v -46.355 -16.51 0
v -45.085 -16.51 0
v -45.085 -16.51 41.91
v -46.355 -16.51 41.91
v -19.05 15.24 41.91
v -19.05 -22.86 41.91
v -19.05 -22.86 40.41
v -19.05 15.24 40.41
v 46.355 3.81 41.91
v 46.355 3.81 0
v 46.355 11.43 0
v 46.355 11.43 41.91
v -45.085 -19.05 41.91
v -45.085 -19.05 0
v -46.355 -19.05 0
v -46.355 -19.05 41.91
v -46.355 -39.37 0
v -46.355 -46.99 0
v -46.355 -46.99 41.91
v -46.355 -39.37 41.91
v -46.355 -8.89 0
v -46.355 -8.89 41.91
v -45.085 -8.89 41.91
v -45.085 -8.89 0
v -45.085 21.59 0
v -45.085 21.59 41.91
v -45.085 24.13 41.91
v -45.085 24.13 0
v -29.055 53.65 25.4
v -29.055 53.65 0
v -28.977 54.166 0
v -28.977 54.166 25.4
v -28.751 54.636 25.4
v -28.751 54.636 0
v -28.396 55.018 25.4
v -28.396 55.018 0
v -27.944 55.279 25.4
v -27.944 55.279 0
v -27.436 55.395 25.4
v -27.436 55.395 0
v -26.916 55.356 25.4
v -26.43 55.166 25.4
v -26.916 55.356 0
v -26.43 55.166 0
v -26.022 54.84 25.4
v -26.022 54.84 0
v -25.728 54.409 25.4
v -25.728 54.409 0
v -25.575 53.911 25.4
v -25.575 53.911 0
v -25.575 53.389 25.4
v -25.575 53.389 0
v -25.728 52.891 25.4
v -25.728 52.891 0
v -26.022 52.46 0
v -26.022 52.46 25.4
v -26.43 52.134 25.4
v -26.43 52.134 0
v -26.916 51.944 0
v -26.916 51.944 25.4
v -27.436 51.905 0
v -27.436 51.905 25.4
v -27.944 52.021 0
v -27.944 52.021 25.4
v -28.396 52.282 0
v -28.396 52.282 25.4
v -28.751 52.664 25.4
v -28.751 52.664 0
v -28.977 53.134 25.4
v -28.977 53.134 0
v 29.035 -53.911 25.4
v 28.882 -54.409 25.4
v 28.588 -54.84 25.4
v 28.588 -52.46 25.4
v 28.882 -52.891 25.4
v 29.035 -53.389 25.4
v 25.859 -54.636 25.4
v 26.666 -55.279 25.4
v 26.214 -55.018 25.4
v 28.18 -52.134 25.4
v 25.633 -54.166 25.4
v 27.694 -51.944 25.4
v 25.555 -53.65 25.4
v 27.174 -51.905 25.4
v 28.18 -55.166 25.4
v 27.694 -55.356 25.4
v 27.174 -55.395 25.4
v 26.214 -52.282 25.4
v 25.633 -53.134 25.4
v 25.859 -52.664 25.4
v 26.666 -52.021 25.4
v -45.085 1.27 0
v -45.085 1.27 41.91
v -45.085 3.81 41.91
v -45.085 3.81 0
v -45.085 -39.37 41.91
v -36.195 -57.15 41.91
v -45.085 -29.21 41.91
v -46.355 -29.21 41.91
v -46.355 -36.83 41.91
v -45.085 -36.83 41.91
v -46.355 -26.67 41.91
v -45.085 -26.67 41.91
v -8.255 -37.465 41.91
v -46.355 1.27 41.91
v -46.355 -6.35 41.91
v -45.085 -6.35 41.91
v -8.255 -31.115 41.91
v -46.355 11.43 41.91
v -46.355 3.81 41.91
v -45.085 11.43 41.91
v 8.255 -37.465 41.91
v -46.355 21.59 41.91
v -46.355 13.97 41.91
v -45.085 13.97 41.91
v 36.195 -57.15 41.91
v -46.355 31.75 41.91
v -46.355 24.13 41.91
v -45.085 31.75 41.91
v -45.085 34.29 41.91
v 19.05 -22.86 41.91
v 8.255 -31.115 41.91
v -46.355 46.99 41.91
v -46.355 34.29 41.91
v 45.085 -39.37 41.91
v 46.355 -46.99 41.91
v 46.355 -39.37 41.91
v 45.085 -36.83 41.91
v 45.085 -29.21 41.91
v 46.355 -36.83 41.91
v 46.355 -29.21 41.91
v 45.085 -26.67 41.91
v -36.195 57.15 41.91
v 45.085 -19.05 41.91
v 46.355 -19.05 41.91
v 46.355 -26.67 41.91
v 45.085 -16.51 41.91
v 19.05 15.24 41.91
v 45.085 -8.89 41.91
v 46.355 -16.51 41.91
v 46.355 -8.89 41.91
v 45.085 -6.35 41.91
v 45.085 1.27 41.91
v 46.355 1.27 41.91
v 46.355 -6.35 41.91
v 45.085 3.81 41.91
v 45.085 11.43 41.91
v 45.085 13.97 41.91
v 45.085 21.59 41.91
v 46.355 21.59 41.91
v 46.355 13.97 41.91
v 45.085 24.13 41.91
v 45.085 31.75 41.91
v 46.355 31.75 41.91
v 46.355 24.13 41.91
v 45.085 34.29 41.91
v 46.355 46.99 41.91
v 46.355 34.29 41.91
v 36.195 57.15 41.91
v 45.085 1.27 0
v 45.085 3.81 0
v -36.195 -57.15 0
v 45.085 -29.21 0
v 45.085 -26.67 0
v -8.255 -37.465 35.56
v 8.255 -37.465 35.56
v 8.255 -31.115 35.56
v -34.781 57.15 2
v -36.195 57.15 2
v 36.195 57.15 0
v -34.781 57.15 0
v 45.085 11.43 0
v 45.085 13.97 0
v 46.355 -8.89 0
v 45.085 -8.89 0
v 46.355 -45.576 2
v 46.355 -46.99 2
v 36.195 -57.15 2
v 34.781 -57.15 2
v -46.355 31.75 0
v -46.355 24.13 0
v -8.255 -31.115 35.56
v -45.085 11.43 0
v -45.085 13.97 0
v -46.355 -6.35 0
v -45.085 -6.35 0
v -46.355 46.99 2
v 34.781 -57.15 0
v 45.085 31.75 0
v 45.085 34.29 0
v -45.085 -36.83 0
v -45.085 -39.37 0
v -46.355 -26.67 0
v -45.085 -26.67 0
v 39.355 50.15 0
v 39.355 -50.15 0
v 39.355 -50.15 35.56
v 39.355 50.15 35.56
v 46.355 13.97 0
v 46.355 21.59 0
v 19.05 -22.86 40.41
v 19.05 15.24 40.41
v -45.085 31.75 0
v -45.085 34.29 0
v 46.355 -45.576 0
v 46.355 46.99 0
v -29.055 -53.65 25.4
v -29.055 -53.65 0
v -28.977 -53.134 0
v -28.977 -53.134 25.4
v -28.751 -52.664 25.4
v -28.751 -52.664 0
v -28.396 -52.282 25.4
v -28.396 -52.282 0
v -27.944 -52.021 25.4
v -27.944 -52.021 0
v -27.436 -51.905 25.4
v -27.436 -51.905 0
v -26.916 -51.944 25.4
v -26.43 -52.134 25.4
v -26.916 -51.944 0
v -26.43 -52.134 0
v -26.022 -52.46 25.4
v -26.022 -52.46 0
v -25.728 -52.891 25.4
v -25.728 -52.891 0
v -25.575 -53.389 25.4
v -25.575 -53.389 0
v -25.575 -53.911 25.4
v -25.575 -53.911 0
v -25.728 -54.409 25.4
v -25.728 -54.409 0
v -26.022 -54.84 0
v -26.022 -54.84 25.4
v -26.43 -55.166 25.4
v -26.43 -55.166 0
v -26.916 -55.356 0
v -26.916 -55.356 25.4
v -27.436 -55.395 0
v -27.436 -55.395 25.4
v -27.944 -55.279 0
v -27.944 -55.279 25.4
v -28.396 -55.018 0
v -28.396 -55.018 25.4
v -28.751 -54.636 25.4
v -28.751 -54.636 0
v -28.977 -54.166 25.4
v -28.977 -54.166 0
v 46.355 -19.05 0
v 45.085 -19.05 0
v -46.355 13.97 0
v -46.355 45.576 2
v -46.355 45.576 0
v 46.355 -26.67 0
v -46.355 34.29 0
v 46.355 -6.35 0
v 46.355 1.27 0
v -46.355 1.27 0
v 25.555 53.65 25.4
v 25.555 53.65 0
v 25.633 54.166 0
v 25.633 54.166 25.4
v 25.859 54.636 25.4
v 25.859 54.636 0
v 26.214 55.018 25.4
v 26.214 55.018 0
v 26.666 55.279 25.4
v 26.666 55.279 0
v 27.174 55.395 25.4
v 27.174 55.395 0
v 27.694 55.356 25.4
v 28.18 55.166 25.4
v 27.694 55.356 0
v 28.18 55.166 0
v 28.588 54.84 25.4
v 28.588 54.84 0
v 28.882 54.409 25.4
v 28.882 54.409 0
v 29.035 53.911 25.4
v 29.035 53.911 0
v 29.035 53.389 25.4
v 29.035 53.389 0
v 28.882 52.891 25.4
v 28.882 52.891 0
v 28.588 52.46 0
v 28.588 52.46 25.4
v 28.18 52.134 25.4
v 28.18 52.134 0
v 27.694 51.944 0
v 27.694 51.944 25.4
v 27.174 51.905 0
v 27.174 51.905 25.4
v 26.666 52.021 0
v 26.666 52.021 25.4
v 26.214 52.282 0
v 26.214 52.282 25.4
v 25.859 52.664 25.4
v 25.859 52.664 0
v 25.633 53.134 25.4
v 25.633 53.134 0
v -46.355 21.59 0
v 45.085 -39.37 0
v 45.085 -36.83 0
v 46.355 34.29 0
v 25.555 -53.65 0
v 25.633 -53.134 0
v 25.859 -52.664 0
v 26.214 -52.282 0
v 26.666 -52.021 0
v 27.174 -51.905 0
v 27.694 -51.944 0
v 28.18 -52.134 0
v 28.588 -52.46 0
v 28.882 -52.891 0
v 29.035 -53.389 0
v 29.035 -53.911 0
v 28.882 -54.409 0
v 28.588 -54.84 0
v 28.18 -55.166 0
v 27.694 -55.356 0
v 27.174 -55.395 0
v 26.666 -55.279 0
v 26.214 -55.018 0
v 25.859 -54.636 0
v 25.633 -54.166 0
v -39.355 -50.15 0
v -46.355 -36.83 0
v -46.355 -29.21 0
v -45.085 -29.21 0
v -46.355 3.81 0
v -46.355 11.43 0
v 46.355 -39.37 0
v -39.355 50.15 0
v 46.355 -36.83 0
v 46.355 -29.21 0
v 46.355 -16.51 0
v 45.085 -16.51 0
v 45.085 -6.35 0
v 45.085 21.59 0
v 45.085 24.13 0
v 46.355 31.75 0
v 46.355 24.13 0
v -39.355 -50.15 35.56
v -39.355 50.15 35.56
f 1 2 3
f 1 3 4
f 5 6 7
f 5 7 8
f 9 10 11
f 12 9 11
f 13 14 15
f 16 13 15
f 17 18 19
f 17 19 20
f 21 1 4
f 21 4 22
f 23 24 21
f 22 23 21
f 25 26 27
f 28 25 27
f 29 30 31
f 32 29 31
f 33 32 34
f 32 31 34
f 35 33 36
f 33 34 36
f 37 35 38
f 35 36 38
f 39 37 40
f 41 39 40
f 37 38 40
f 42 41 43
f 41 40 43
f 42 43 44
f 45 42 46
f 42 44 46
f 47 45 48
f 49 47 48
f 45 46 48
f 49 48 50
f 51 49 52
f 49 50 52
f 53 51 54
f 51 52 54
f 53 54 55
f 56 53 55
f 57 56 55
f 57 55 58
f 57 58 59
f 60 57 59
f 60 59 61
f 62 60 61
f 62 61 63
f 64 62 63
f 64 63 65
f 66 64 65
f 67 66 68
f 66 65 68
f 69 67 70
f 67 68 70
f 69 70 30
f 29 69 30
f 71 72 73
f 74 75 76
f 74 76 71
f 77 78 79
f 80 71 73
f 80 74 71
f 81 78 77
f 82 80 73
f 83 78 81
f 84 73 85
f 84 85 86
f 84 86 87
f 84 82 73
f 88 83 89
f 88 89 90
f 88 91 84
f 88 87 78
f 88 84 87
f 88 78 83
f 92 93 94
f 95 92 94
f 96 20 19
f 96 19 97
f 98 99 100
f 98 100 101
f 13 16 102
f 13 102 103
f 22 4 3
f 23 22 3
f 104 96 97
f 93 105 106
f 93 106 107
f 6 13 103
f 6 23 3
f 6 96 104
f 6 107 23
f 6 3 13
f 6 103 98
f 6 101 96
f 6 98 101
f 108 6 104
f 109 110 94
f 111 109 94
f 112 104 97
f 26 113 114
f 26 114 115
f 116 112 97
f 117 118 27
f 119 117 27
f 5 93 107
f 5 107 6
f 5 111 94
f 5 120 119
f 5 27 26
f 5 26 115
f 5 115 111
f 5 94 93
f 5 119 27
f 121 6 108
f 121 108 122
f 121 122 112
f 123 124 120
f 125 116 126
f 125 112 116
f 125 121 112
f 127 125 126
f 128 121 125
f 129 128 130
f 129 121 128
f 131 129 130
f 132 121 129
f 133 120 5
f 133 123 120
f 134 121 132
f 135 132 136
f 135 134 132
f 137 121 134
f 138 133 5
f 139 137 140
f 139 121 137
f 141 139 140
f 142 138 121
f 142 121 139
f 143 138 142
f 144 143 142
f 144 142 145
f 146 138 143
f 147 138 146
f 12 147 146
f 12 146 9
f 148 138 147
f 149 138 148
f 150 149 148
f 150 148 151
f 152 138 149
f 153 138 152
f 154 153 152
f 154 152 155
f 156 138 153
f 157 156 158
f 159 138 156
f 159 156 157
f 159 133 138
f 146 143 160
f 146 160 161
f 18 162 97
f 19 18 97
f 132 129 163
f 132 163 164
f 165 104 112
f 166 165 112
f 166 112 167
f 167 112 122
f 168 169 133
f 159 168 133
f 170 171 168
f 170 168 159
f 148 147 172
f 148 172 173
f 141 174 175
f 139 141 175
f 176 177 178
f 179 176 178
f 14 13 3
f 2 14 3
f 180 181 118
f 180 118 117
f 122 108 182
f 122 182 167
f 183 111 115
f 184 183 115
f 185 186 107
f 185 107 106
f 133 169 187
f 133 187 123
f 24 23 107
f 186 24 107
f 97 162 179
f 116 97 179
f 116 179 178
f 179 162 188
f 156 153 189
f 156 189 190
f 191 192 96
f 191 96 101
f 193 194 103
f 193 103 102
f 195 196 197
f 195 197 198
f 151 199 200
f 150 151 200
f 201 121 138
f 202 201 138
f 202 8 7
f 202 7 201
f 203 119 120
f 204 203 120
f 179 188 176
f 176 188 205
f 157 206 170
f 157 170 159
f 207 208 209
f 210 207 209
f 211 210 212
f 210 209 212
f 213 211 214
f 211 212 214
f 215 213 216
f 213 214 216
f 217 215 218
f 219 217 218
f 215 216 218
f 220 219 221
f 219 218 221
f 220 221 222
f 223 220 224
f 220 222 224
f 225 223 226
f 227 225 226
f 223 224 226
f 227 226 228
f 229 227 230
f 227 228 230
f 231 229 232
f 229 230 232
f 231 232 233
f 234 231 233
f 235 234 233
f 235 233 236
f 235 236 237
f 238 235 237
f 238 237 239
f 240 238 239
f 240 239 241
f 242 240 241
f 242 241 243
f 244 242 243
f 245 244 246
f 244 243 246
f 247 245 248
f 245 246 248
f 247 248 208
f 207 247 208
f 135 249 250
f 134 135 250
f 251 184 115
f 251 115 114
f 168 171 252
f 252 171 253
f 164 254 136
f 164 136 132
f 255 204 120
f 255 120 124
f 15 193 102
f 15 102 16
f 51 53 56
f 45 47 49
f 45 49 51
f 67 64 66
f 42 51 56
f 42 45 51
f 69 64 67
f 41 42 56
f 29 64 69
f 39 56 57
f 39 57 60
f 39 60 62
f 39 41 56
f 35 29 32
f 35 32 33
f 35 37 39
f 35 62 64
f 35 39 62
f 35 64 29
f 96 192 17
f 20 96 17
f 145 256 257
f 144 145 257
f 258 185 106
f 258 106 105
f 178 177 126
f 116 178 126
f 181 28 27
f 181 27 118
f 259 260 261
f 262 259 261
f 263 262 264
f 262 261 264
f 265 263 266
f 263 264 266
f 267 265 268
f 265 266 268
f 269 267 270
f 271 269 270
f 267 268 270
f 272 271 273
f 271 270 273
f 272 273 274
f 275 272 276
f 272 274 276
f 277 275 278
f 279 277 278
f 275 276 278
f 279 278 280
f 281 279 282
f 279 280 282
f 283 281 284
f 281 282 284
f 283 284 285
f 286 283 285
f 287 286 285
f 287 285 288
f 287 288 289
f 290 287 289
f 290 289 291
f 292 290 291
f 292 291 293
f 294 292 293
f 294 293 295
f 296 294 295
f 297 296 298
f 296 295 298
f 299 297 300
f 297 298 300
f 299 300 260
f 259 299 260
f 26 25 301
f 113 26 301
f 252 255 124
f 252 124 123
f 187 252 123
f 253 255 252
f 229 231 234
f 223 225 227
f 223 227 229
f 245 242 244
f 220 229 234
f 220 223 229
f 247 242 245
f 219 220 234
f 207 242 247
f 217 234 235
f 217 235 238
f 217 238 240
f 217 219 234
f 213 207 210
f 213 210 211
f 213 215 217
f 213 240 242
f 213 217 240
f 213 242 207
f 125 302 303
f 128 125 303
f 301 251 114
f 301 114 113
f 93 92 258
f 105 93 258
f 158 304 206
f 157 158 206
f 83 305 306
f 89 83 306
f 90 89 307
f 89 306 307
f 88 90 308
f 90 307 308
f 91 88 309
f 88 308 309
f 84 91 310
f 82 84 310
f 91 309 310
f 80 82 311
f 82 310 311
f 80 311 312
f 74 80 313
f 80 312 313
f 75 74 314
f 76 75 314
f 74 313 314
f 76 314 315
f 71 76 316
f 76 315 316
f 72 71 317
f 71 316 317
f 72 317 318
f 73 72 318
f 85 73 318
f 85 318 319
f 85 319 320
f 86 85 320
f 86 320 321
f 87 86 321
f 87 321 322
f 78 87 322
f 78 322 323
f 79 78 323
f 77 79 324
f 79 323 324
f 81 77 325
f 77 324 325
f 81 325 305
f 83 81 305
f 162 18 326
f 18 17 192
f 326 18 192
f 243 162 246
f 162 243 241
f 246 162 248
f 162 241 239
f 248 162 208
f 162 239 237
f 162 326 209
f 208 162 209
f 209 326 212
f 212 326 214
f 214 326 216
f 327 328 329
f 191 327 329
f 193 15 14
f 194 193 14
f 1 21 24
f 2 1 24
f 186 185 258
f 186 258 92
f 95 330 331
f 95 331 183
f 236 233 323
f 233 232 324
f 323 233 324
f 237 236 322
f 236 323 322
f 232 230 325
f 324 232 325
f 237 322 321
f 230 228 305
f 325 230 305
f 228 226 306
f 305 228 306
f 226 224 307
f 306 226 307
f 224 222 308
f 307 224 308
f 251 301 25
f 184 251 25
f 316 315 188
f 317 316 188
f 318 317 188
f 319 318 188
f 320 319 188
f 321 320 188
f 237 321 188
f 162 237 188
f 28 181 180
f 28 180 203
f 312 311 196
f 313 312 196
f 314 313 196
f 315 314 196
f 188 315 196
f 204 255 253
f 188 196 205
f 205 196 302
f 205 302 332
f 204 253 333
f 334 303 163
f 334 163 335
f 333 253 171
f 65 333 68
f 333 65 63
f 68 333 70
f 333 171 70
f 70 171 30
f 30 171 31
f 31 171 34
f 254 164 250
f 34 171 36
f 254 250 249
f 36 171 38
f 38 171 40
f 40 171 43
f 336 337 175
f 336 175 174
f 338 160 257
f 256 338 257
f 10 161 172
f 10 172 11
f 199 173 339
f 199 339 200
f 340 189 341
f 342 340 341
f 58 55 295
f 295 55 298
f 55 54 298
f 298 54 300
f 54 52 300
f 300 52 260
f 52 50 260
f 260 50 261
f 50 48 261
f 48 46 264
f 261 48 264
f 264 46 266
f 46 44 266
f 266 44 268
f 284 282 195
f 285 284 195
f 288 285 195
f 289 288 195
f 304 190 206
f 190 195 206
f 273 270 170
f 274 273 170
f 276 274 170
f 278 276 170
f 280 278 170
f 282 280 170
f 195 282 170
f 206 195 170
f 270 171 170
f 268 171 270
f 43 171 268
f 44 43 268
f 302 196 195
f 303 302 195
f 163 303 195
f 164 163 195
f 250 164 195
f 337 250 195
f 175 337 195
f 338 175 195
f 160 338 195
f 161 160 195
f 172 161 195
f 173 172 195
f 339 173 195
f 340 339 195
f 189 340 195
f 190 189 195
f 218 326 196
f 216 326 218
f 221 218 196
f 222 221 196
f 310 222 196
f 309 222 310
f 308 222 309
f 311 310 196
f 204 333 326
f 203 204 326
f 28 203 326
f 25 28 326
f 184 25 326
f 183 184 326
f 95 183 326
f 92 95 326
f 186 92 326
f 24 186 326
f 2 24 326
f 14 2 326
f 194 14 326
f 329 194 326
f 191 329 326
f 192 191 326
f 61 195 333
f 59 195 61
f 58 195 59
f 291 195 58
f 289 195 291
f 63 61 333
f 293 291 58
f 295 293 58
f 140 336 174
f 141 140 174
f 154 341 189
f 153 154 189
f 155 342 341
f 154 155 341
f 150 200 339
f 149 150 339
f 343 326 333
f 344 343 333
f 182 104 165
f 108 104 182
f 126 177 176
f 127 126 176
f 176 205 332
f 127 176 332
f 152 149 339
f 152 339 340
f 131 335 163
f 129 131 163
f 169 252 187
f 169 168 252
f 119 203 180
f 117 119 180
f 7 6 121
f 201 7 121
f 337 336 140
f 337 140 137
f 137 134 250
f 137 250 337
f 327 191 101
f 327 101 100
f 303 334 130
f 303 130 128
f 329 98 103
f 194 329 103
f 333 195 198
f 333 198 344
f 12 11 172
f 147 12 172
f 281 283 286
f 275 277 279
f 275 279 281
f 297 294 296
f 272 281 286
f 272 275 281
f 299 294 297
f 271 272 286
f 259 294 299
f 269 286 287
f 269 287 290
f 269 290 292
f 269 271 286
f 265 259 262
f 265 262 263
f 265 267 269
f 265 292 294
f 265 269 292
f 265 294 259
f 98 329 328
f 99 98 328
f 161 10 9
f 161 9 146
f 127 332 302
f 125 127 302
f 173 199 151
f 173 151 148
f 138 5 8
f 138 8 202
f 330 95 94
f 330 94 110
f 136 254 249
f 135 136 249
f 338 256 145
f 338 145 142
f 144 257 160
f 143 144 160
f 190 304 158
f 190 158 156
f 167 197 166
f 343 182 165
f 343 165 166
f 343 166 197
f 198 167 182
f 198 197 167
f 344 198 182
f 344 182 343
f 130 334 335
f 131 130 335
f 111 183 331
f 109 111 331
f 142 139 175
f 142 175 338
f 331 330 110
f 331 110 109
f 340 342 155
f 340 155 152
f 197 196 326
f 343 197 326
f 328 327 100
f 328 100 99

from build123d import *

# Parameters (mm, degrees)
SKETCH1_W           = 92.71
SKETCH1_H           = 114.3
BOSS_EXTRUDE1_DEPTH = 41.91
SKETCH2_W           = 2.54
SKETCH2_H           = 2.54
CUT_EXTRUDE1_DEPTH  = 85.683862837
CHAMFER1_SIZE       = 10.16
SKETCH3_R           = 1.750000056
CUT_EXTRUDE2_DEPTH  = 25.4
SKETCH4_W           = 78.71
SKETCH4_H           = 100.30000006
CUT_EXTRUDE3_DEPTH  = 35.56
SKETCH6_W           = 16.51
SKETCH6_H           = 6.35
CUT_EXTRUDE5_DEPTH  = 85.683862837
CUT_EXTRUDE6_DEPTH  = 2
SKETCH8_W           = 38.1
SKETCH8_H           = 38.1
CUT_EXTRUDE7_DEPTH  = 1.5


with BuildPart() as part:
    # Sketch1 → Boss-Extrude1 (new body)
    with BuildSketch(Plane.XY):
        Rectangle(SKETCH1_W, SKETCH1_H)
    extrude(amount=BOSS_EXTRUDE1_DEPTH)

    # Sketch2 → Cut-Extrude1 (cut, through all)
    with BuildSketch(Plane(origin=(0, 0, 0), x_dir=(-1, 0, 0), z_dir=(0, 0, -1))):
        with Locations((-46.355, -38.1)):
            Rectangle(SKETCH2_W, SKETCH2_H)
        with Locations((46.355, -38.1)):
            Rectangle(SKETCH2_W, SKETCH2_H)
        with Locations((-46.355, -27.94)):
            Rectangle(SKETCH2_W, SKETCH2_H)
        with Locations((46.355, -27.94)):
            Rectangle(SKETCH2_W, SKETCH2_H)
        with Locations((-46.355, -17.78)):
            Rectangle(SKETCH2_W, SKETCH2_H)
        with Locations((46.355, -17.78)):
            Rectangle(SKETCH2_W, SKETCH2_H)
        with Locations((-46.355, -7.62)):
            Rectangle(SKETCH2_W, SKETCH2_H)
        with Locations((46.355, -7.62)):
            Rectangle(SKETCH2_W, SKETCH2_H)
        with Locations((-46.355, 2.54)):
            Rectangle(SKETCH2_W, SKETCH2_H)
        with Locations((46.355, 2.54)):
            Rectangle(SKETCH2_W, SKETCH2_H)
        with Locations((-46.355, 12.7)):
            Rectangle(SKETCH2_W, SKETCH2_H)
        with Locations((46.355, 12.7)):
            Rectangle(SKETCH2_W, SKETCH2_H)
        with Locations((-46.355, 22.86)):
            Rectangle(SKETCH2_W, SKETCH2_H)
        with Locations((46.355, 22.86)):
            Rectangle(SKETCH2_W, SKETCH2_H)
        with Locations((-46.355, 33.02)):
            Rectangle(SKETCH2_W, SKETCH2_H)
        with Locations((46.355, 33.02)):
            Rectangle(SKETCH2_W, SKETCH2_H)
    extrude(amount=-CUT_EXTRUDE1_DEPTH, mode=Mode.SUBTRACT)

    # Chamfer1
    chamfer1_edges = [part.edges().sort_by_distance(p)[0] for p in [
        (46.355, -57.15, 20.955),
        (-46.355, -57.15, 20.955),
        (-46.355, 57.15, 20.955),
        (46.355, 57.15, 20.955),
    ]]
    chamfer(chamfer1_edges, length=CHAMFER1_SIZE)

    # Sketch3 → Cut-Extrude2 (cut)
    with BuildSketch(Plane(origin=(0, 0, 0), x_dir=(-1, 0, 0), z_dir=(0, 0, -1))):
        with Locations((-27.305, -53.649999888)):
            Circle(SKETCH3_R)
        with Locations((-27.305, 53.65)):
            Circle(SKETCH3_R)
        with Locations((27.305, 53.649999888)):
            Circle(SKETCH3_R)
        with Locations((27.305, -53.649999888)):
            Circle(SKETCH3_R)
    extrude(amount=-CUT_EXTRUDE2_DEPTH, mode=Mode.SUBTRACT)

    # Sketch4 → Cut-Extrude3 (cut)
    with BuildSketch(Plane(origin=(0, 0, 0), x_dir=(-1, 0, 0), z_dir=(0, 0, -1))):
        Rectangle(SKETCH4_W, SKETCH4_H)
    extrude(amount=-CUT_EXTRUDE3_DEPTH, mode=Mode.SUBTRACT)

    # Sketch6 → Cut-Extrude5 (cut, through all)
    with BuildSketch(Plane.XY.offset(41.91)):
        with Locations((0, -34.29)):
            Rectangle(SKETCH6_W, SKETCH6_H)
    extrude(amount=-CUT_EXTRUDE5_DEPTH, mode=Mode.SUBTRACT)

    # Sketch7 → Cut-Extrude6 (cut)
    with BuildSketch(Plane(origin=(0, 0, 0), x_dir=(-1, 0, 0), z_dir=(0, 0, -1))):
        Polygon((40.567893219, 51.362893219), (46.355, 45.575786438), (46.355, 46.99), (36.195, 57.15), (34.780786438, 57.15), align=None)
        Polygon((-40.567893219, -51.362893219), (-46.355, -45.575786438), (-46.355, -46.99), (-36.195, -57.15), (-34.780786438, -57.15), align=None)
    extrude(amount=-CUT_EXTRUDE6_DEPTH, mode=Mode.SUBTRACT)

    # Sketch8 → Cut-Extrude7 (cut)
    with BuildSketch(Plane.XY.offset(41.91)):
        with Locations((0, -3.81)):
            Rectangle(SKETCH8_W, SKETCH8_H)
    extrude(amount=-CUT_EXTRUDE7_DEPTH, mode=Mode.SUBTRACT)


solid = part.part
